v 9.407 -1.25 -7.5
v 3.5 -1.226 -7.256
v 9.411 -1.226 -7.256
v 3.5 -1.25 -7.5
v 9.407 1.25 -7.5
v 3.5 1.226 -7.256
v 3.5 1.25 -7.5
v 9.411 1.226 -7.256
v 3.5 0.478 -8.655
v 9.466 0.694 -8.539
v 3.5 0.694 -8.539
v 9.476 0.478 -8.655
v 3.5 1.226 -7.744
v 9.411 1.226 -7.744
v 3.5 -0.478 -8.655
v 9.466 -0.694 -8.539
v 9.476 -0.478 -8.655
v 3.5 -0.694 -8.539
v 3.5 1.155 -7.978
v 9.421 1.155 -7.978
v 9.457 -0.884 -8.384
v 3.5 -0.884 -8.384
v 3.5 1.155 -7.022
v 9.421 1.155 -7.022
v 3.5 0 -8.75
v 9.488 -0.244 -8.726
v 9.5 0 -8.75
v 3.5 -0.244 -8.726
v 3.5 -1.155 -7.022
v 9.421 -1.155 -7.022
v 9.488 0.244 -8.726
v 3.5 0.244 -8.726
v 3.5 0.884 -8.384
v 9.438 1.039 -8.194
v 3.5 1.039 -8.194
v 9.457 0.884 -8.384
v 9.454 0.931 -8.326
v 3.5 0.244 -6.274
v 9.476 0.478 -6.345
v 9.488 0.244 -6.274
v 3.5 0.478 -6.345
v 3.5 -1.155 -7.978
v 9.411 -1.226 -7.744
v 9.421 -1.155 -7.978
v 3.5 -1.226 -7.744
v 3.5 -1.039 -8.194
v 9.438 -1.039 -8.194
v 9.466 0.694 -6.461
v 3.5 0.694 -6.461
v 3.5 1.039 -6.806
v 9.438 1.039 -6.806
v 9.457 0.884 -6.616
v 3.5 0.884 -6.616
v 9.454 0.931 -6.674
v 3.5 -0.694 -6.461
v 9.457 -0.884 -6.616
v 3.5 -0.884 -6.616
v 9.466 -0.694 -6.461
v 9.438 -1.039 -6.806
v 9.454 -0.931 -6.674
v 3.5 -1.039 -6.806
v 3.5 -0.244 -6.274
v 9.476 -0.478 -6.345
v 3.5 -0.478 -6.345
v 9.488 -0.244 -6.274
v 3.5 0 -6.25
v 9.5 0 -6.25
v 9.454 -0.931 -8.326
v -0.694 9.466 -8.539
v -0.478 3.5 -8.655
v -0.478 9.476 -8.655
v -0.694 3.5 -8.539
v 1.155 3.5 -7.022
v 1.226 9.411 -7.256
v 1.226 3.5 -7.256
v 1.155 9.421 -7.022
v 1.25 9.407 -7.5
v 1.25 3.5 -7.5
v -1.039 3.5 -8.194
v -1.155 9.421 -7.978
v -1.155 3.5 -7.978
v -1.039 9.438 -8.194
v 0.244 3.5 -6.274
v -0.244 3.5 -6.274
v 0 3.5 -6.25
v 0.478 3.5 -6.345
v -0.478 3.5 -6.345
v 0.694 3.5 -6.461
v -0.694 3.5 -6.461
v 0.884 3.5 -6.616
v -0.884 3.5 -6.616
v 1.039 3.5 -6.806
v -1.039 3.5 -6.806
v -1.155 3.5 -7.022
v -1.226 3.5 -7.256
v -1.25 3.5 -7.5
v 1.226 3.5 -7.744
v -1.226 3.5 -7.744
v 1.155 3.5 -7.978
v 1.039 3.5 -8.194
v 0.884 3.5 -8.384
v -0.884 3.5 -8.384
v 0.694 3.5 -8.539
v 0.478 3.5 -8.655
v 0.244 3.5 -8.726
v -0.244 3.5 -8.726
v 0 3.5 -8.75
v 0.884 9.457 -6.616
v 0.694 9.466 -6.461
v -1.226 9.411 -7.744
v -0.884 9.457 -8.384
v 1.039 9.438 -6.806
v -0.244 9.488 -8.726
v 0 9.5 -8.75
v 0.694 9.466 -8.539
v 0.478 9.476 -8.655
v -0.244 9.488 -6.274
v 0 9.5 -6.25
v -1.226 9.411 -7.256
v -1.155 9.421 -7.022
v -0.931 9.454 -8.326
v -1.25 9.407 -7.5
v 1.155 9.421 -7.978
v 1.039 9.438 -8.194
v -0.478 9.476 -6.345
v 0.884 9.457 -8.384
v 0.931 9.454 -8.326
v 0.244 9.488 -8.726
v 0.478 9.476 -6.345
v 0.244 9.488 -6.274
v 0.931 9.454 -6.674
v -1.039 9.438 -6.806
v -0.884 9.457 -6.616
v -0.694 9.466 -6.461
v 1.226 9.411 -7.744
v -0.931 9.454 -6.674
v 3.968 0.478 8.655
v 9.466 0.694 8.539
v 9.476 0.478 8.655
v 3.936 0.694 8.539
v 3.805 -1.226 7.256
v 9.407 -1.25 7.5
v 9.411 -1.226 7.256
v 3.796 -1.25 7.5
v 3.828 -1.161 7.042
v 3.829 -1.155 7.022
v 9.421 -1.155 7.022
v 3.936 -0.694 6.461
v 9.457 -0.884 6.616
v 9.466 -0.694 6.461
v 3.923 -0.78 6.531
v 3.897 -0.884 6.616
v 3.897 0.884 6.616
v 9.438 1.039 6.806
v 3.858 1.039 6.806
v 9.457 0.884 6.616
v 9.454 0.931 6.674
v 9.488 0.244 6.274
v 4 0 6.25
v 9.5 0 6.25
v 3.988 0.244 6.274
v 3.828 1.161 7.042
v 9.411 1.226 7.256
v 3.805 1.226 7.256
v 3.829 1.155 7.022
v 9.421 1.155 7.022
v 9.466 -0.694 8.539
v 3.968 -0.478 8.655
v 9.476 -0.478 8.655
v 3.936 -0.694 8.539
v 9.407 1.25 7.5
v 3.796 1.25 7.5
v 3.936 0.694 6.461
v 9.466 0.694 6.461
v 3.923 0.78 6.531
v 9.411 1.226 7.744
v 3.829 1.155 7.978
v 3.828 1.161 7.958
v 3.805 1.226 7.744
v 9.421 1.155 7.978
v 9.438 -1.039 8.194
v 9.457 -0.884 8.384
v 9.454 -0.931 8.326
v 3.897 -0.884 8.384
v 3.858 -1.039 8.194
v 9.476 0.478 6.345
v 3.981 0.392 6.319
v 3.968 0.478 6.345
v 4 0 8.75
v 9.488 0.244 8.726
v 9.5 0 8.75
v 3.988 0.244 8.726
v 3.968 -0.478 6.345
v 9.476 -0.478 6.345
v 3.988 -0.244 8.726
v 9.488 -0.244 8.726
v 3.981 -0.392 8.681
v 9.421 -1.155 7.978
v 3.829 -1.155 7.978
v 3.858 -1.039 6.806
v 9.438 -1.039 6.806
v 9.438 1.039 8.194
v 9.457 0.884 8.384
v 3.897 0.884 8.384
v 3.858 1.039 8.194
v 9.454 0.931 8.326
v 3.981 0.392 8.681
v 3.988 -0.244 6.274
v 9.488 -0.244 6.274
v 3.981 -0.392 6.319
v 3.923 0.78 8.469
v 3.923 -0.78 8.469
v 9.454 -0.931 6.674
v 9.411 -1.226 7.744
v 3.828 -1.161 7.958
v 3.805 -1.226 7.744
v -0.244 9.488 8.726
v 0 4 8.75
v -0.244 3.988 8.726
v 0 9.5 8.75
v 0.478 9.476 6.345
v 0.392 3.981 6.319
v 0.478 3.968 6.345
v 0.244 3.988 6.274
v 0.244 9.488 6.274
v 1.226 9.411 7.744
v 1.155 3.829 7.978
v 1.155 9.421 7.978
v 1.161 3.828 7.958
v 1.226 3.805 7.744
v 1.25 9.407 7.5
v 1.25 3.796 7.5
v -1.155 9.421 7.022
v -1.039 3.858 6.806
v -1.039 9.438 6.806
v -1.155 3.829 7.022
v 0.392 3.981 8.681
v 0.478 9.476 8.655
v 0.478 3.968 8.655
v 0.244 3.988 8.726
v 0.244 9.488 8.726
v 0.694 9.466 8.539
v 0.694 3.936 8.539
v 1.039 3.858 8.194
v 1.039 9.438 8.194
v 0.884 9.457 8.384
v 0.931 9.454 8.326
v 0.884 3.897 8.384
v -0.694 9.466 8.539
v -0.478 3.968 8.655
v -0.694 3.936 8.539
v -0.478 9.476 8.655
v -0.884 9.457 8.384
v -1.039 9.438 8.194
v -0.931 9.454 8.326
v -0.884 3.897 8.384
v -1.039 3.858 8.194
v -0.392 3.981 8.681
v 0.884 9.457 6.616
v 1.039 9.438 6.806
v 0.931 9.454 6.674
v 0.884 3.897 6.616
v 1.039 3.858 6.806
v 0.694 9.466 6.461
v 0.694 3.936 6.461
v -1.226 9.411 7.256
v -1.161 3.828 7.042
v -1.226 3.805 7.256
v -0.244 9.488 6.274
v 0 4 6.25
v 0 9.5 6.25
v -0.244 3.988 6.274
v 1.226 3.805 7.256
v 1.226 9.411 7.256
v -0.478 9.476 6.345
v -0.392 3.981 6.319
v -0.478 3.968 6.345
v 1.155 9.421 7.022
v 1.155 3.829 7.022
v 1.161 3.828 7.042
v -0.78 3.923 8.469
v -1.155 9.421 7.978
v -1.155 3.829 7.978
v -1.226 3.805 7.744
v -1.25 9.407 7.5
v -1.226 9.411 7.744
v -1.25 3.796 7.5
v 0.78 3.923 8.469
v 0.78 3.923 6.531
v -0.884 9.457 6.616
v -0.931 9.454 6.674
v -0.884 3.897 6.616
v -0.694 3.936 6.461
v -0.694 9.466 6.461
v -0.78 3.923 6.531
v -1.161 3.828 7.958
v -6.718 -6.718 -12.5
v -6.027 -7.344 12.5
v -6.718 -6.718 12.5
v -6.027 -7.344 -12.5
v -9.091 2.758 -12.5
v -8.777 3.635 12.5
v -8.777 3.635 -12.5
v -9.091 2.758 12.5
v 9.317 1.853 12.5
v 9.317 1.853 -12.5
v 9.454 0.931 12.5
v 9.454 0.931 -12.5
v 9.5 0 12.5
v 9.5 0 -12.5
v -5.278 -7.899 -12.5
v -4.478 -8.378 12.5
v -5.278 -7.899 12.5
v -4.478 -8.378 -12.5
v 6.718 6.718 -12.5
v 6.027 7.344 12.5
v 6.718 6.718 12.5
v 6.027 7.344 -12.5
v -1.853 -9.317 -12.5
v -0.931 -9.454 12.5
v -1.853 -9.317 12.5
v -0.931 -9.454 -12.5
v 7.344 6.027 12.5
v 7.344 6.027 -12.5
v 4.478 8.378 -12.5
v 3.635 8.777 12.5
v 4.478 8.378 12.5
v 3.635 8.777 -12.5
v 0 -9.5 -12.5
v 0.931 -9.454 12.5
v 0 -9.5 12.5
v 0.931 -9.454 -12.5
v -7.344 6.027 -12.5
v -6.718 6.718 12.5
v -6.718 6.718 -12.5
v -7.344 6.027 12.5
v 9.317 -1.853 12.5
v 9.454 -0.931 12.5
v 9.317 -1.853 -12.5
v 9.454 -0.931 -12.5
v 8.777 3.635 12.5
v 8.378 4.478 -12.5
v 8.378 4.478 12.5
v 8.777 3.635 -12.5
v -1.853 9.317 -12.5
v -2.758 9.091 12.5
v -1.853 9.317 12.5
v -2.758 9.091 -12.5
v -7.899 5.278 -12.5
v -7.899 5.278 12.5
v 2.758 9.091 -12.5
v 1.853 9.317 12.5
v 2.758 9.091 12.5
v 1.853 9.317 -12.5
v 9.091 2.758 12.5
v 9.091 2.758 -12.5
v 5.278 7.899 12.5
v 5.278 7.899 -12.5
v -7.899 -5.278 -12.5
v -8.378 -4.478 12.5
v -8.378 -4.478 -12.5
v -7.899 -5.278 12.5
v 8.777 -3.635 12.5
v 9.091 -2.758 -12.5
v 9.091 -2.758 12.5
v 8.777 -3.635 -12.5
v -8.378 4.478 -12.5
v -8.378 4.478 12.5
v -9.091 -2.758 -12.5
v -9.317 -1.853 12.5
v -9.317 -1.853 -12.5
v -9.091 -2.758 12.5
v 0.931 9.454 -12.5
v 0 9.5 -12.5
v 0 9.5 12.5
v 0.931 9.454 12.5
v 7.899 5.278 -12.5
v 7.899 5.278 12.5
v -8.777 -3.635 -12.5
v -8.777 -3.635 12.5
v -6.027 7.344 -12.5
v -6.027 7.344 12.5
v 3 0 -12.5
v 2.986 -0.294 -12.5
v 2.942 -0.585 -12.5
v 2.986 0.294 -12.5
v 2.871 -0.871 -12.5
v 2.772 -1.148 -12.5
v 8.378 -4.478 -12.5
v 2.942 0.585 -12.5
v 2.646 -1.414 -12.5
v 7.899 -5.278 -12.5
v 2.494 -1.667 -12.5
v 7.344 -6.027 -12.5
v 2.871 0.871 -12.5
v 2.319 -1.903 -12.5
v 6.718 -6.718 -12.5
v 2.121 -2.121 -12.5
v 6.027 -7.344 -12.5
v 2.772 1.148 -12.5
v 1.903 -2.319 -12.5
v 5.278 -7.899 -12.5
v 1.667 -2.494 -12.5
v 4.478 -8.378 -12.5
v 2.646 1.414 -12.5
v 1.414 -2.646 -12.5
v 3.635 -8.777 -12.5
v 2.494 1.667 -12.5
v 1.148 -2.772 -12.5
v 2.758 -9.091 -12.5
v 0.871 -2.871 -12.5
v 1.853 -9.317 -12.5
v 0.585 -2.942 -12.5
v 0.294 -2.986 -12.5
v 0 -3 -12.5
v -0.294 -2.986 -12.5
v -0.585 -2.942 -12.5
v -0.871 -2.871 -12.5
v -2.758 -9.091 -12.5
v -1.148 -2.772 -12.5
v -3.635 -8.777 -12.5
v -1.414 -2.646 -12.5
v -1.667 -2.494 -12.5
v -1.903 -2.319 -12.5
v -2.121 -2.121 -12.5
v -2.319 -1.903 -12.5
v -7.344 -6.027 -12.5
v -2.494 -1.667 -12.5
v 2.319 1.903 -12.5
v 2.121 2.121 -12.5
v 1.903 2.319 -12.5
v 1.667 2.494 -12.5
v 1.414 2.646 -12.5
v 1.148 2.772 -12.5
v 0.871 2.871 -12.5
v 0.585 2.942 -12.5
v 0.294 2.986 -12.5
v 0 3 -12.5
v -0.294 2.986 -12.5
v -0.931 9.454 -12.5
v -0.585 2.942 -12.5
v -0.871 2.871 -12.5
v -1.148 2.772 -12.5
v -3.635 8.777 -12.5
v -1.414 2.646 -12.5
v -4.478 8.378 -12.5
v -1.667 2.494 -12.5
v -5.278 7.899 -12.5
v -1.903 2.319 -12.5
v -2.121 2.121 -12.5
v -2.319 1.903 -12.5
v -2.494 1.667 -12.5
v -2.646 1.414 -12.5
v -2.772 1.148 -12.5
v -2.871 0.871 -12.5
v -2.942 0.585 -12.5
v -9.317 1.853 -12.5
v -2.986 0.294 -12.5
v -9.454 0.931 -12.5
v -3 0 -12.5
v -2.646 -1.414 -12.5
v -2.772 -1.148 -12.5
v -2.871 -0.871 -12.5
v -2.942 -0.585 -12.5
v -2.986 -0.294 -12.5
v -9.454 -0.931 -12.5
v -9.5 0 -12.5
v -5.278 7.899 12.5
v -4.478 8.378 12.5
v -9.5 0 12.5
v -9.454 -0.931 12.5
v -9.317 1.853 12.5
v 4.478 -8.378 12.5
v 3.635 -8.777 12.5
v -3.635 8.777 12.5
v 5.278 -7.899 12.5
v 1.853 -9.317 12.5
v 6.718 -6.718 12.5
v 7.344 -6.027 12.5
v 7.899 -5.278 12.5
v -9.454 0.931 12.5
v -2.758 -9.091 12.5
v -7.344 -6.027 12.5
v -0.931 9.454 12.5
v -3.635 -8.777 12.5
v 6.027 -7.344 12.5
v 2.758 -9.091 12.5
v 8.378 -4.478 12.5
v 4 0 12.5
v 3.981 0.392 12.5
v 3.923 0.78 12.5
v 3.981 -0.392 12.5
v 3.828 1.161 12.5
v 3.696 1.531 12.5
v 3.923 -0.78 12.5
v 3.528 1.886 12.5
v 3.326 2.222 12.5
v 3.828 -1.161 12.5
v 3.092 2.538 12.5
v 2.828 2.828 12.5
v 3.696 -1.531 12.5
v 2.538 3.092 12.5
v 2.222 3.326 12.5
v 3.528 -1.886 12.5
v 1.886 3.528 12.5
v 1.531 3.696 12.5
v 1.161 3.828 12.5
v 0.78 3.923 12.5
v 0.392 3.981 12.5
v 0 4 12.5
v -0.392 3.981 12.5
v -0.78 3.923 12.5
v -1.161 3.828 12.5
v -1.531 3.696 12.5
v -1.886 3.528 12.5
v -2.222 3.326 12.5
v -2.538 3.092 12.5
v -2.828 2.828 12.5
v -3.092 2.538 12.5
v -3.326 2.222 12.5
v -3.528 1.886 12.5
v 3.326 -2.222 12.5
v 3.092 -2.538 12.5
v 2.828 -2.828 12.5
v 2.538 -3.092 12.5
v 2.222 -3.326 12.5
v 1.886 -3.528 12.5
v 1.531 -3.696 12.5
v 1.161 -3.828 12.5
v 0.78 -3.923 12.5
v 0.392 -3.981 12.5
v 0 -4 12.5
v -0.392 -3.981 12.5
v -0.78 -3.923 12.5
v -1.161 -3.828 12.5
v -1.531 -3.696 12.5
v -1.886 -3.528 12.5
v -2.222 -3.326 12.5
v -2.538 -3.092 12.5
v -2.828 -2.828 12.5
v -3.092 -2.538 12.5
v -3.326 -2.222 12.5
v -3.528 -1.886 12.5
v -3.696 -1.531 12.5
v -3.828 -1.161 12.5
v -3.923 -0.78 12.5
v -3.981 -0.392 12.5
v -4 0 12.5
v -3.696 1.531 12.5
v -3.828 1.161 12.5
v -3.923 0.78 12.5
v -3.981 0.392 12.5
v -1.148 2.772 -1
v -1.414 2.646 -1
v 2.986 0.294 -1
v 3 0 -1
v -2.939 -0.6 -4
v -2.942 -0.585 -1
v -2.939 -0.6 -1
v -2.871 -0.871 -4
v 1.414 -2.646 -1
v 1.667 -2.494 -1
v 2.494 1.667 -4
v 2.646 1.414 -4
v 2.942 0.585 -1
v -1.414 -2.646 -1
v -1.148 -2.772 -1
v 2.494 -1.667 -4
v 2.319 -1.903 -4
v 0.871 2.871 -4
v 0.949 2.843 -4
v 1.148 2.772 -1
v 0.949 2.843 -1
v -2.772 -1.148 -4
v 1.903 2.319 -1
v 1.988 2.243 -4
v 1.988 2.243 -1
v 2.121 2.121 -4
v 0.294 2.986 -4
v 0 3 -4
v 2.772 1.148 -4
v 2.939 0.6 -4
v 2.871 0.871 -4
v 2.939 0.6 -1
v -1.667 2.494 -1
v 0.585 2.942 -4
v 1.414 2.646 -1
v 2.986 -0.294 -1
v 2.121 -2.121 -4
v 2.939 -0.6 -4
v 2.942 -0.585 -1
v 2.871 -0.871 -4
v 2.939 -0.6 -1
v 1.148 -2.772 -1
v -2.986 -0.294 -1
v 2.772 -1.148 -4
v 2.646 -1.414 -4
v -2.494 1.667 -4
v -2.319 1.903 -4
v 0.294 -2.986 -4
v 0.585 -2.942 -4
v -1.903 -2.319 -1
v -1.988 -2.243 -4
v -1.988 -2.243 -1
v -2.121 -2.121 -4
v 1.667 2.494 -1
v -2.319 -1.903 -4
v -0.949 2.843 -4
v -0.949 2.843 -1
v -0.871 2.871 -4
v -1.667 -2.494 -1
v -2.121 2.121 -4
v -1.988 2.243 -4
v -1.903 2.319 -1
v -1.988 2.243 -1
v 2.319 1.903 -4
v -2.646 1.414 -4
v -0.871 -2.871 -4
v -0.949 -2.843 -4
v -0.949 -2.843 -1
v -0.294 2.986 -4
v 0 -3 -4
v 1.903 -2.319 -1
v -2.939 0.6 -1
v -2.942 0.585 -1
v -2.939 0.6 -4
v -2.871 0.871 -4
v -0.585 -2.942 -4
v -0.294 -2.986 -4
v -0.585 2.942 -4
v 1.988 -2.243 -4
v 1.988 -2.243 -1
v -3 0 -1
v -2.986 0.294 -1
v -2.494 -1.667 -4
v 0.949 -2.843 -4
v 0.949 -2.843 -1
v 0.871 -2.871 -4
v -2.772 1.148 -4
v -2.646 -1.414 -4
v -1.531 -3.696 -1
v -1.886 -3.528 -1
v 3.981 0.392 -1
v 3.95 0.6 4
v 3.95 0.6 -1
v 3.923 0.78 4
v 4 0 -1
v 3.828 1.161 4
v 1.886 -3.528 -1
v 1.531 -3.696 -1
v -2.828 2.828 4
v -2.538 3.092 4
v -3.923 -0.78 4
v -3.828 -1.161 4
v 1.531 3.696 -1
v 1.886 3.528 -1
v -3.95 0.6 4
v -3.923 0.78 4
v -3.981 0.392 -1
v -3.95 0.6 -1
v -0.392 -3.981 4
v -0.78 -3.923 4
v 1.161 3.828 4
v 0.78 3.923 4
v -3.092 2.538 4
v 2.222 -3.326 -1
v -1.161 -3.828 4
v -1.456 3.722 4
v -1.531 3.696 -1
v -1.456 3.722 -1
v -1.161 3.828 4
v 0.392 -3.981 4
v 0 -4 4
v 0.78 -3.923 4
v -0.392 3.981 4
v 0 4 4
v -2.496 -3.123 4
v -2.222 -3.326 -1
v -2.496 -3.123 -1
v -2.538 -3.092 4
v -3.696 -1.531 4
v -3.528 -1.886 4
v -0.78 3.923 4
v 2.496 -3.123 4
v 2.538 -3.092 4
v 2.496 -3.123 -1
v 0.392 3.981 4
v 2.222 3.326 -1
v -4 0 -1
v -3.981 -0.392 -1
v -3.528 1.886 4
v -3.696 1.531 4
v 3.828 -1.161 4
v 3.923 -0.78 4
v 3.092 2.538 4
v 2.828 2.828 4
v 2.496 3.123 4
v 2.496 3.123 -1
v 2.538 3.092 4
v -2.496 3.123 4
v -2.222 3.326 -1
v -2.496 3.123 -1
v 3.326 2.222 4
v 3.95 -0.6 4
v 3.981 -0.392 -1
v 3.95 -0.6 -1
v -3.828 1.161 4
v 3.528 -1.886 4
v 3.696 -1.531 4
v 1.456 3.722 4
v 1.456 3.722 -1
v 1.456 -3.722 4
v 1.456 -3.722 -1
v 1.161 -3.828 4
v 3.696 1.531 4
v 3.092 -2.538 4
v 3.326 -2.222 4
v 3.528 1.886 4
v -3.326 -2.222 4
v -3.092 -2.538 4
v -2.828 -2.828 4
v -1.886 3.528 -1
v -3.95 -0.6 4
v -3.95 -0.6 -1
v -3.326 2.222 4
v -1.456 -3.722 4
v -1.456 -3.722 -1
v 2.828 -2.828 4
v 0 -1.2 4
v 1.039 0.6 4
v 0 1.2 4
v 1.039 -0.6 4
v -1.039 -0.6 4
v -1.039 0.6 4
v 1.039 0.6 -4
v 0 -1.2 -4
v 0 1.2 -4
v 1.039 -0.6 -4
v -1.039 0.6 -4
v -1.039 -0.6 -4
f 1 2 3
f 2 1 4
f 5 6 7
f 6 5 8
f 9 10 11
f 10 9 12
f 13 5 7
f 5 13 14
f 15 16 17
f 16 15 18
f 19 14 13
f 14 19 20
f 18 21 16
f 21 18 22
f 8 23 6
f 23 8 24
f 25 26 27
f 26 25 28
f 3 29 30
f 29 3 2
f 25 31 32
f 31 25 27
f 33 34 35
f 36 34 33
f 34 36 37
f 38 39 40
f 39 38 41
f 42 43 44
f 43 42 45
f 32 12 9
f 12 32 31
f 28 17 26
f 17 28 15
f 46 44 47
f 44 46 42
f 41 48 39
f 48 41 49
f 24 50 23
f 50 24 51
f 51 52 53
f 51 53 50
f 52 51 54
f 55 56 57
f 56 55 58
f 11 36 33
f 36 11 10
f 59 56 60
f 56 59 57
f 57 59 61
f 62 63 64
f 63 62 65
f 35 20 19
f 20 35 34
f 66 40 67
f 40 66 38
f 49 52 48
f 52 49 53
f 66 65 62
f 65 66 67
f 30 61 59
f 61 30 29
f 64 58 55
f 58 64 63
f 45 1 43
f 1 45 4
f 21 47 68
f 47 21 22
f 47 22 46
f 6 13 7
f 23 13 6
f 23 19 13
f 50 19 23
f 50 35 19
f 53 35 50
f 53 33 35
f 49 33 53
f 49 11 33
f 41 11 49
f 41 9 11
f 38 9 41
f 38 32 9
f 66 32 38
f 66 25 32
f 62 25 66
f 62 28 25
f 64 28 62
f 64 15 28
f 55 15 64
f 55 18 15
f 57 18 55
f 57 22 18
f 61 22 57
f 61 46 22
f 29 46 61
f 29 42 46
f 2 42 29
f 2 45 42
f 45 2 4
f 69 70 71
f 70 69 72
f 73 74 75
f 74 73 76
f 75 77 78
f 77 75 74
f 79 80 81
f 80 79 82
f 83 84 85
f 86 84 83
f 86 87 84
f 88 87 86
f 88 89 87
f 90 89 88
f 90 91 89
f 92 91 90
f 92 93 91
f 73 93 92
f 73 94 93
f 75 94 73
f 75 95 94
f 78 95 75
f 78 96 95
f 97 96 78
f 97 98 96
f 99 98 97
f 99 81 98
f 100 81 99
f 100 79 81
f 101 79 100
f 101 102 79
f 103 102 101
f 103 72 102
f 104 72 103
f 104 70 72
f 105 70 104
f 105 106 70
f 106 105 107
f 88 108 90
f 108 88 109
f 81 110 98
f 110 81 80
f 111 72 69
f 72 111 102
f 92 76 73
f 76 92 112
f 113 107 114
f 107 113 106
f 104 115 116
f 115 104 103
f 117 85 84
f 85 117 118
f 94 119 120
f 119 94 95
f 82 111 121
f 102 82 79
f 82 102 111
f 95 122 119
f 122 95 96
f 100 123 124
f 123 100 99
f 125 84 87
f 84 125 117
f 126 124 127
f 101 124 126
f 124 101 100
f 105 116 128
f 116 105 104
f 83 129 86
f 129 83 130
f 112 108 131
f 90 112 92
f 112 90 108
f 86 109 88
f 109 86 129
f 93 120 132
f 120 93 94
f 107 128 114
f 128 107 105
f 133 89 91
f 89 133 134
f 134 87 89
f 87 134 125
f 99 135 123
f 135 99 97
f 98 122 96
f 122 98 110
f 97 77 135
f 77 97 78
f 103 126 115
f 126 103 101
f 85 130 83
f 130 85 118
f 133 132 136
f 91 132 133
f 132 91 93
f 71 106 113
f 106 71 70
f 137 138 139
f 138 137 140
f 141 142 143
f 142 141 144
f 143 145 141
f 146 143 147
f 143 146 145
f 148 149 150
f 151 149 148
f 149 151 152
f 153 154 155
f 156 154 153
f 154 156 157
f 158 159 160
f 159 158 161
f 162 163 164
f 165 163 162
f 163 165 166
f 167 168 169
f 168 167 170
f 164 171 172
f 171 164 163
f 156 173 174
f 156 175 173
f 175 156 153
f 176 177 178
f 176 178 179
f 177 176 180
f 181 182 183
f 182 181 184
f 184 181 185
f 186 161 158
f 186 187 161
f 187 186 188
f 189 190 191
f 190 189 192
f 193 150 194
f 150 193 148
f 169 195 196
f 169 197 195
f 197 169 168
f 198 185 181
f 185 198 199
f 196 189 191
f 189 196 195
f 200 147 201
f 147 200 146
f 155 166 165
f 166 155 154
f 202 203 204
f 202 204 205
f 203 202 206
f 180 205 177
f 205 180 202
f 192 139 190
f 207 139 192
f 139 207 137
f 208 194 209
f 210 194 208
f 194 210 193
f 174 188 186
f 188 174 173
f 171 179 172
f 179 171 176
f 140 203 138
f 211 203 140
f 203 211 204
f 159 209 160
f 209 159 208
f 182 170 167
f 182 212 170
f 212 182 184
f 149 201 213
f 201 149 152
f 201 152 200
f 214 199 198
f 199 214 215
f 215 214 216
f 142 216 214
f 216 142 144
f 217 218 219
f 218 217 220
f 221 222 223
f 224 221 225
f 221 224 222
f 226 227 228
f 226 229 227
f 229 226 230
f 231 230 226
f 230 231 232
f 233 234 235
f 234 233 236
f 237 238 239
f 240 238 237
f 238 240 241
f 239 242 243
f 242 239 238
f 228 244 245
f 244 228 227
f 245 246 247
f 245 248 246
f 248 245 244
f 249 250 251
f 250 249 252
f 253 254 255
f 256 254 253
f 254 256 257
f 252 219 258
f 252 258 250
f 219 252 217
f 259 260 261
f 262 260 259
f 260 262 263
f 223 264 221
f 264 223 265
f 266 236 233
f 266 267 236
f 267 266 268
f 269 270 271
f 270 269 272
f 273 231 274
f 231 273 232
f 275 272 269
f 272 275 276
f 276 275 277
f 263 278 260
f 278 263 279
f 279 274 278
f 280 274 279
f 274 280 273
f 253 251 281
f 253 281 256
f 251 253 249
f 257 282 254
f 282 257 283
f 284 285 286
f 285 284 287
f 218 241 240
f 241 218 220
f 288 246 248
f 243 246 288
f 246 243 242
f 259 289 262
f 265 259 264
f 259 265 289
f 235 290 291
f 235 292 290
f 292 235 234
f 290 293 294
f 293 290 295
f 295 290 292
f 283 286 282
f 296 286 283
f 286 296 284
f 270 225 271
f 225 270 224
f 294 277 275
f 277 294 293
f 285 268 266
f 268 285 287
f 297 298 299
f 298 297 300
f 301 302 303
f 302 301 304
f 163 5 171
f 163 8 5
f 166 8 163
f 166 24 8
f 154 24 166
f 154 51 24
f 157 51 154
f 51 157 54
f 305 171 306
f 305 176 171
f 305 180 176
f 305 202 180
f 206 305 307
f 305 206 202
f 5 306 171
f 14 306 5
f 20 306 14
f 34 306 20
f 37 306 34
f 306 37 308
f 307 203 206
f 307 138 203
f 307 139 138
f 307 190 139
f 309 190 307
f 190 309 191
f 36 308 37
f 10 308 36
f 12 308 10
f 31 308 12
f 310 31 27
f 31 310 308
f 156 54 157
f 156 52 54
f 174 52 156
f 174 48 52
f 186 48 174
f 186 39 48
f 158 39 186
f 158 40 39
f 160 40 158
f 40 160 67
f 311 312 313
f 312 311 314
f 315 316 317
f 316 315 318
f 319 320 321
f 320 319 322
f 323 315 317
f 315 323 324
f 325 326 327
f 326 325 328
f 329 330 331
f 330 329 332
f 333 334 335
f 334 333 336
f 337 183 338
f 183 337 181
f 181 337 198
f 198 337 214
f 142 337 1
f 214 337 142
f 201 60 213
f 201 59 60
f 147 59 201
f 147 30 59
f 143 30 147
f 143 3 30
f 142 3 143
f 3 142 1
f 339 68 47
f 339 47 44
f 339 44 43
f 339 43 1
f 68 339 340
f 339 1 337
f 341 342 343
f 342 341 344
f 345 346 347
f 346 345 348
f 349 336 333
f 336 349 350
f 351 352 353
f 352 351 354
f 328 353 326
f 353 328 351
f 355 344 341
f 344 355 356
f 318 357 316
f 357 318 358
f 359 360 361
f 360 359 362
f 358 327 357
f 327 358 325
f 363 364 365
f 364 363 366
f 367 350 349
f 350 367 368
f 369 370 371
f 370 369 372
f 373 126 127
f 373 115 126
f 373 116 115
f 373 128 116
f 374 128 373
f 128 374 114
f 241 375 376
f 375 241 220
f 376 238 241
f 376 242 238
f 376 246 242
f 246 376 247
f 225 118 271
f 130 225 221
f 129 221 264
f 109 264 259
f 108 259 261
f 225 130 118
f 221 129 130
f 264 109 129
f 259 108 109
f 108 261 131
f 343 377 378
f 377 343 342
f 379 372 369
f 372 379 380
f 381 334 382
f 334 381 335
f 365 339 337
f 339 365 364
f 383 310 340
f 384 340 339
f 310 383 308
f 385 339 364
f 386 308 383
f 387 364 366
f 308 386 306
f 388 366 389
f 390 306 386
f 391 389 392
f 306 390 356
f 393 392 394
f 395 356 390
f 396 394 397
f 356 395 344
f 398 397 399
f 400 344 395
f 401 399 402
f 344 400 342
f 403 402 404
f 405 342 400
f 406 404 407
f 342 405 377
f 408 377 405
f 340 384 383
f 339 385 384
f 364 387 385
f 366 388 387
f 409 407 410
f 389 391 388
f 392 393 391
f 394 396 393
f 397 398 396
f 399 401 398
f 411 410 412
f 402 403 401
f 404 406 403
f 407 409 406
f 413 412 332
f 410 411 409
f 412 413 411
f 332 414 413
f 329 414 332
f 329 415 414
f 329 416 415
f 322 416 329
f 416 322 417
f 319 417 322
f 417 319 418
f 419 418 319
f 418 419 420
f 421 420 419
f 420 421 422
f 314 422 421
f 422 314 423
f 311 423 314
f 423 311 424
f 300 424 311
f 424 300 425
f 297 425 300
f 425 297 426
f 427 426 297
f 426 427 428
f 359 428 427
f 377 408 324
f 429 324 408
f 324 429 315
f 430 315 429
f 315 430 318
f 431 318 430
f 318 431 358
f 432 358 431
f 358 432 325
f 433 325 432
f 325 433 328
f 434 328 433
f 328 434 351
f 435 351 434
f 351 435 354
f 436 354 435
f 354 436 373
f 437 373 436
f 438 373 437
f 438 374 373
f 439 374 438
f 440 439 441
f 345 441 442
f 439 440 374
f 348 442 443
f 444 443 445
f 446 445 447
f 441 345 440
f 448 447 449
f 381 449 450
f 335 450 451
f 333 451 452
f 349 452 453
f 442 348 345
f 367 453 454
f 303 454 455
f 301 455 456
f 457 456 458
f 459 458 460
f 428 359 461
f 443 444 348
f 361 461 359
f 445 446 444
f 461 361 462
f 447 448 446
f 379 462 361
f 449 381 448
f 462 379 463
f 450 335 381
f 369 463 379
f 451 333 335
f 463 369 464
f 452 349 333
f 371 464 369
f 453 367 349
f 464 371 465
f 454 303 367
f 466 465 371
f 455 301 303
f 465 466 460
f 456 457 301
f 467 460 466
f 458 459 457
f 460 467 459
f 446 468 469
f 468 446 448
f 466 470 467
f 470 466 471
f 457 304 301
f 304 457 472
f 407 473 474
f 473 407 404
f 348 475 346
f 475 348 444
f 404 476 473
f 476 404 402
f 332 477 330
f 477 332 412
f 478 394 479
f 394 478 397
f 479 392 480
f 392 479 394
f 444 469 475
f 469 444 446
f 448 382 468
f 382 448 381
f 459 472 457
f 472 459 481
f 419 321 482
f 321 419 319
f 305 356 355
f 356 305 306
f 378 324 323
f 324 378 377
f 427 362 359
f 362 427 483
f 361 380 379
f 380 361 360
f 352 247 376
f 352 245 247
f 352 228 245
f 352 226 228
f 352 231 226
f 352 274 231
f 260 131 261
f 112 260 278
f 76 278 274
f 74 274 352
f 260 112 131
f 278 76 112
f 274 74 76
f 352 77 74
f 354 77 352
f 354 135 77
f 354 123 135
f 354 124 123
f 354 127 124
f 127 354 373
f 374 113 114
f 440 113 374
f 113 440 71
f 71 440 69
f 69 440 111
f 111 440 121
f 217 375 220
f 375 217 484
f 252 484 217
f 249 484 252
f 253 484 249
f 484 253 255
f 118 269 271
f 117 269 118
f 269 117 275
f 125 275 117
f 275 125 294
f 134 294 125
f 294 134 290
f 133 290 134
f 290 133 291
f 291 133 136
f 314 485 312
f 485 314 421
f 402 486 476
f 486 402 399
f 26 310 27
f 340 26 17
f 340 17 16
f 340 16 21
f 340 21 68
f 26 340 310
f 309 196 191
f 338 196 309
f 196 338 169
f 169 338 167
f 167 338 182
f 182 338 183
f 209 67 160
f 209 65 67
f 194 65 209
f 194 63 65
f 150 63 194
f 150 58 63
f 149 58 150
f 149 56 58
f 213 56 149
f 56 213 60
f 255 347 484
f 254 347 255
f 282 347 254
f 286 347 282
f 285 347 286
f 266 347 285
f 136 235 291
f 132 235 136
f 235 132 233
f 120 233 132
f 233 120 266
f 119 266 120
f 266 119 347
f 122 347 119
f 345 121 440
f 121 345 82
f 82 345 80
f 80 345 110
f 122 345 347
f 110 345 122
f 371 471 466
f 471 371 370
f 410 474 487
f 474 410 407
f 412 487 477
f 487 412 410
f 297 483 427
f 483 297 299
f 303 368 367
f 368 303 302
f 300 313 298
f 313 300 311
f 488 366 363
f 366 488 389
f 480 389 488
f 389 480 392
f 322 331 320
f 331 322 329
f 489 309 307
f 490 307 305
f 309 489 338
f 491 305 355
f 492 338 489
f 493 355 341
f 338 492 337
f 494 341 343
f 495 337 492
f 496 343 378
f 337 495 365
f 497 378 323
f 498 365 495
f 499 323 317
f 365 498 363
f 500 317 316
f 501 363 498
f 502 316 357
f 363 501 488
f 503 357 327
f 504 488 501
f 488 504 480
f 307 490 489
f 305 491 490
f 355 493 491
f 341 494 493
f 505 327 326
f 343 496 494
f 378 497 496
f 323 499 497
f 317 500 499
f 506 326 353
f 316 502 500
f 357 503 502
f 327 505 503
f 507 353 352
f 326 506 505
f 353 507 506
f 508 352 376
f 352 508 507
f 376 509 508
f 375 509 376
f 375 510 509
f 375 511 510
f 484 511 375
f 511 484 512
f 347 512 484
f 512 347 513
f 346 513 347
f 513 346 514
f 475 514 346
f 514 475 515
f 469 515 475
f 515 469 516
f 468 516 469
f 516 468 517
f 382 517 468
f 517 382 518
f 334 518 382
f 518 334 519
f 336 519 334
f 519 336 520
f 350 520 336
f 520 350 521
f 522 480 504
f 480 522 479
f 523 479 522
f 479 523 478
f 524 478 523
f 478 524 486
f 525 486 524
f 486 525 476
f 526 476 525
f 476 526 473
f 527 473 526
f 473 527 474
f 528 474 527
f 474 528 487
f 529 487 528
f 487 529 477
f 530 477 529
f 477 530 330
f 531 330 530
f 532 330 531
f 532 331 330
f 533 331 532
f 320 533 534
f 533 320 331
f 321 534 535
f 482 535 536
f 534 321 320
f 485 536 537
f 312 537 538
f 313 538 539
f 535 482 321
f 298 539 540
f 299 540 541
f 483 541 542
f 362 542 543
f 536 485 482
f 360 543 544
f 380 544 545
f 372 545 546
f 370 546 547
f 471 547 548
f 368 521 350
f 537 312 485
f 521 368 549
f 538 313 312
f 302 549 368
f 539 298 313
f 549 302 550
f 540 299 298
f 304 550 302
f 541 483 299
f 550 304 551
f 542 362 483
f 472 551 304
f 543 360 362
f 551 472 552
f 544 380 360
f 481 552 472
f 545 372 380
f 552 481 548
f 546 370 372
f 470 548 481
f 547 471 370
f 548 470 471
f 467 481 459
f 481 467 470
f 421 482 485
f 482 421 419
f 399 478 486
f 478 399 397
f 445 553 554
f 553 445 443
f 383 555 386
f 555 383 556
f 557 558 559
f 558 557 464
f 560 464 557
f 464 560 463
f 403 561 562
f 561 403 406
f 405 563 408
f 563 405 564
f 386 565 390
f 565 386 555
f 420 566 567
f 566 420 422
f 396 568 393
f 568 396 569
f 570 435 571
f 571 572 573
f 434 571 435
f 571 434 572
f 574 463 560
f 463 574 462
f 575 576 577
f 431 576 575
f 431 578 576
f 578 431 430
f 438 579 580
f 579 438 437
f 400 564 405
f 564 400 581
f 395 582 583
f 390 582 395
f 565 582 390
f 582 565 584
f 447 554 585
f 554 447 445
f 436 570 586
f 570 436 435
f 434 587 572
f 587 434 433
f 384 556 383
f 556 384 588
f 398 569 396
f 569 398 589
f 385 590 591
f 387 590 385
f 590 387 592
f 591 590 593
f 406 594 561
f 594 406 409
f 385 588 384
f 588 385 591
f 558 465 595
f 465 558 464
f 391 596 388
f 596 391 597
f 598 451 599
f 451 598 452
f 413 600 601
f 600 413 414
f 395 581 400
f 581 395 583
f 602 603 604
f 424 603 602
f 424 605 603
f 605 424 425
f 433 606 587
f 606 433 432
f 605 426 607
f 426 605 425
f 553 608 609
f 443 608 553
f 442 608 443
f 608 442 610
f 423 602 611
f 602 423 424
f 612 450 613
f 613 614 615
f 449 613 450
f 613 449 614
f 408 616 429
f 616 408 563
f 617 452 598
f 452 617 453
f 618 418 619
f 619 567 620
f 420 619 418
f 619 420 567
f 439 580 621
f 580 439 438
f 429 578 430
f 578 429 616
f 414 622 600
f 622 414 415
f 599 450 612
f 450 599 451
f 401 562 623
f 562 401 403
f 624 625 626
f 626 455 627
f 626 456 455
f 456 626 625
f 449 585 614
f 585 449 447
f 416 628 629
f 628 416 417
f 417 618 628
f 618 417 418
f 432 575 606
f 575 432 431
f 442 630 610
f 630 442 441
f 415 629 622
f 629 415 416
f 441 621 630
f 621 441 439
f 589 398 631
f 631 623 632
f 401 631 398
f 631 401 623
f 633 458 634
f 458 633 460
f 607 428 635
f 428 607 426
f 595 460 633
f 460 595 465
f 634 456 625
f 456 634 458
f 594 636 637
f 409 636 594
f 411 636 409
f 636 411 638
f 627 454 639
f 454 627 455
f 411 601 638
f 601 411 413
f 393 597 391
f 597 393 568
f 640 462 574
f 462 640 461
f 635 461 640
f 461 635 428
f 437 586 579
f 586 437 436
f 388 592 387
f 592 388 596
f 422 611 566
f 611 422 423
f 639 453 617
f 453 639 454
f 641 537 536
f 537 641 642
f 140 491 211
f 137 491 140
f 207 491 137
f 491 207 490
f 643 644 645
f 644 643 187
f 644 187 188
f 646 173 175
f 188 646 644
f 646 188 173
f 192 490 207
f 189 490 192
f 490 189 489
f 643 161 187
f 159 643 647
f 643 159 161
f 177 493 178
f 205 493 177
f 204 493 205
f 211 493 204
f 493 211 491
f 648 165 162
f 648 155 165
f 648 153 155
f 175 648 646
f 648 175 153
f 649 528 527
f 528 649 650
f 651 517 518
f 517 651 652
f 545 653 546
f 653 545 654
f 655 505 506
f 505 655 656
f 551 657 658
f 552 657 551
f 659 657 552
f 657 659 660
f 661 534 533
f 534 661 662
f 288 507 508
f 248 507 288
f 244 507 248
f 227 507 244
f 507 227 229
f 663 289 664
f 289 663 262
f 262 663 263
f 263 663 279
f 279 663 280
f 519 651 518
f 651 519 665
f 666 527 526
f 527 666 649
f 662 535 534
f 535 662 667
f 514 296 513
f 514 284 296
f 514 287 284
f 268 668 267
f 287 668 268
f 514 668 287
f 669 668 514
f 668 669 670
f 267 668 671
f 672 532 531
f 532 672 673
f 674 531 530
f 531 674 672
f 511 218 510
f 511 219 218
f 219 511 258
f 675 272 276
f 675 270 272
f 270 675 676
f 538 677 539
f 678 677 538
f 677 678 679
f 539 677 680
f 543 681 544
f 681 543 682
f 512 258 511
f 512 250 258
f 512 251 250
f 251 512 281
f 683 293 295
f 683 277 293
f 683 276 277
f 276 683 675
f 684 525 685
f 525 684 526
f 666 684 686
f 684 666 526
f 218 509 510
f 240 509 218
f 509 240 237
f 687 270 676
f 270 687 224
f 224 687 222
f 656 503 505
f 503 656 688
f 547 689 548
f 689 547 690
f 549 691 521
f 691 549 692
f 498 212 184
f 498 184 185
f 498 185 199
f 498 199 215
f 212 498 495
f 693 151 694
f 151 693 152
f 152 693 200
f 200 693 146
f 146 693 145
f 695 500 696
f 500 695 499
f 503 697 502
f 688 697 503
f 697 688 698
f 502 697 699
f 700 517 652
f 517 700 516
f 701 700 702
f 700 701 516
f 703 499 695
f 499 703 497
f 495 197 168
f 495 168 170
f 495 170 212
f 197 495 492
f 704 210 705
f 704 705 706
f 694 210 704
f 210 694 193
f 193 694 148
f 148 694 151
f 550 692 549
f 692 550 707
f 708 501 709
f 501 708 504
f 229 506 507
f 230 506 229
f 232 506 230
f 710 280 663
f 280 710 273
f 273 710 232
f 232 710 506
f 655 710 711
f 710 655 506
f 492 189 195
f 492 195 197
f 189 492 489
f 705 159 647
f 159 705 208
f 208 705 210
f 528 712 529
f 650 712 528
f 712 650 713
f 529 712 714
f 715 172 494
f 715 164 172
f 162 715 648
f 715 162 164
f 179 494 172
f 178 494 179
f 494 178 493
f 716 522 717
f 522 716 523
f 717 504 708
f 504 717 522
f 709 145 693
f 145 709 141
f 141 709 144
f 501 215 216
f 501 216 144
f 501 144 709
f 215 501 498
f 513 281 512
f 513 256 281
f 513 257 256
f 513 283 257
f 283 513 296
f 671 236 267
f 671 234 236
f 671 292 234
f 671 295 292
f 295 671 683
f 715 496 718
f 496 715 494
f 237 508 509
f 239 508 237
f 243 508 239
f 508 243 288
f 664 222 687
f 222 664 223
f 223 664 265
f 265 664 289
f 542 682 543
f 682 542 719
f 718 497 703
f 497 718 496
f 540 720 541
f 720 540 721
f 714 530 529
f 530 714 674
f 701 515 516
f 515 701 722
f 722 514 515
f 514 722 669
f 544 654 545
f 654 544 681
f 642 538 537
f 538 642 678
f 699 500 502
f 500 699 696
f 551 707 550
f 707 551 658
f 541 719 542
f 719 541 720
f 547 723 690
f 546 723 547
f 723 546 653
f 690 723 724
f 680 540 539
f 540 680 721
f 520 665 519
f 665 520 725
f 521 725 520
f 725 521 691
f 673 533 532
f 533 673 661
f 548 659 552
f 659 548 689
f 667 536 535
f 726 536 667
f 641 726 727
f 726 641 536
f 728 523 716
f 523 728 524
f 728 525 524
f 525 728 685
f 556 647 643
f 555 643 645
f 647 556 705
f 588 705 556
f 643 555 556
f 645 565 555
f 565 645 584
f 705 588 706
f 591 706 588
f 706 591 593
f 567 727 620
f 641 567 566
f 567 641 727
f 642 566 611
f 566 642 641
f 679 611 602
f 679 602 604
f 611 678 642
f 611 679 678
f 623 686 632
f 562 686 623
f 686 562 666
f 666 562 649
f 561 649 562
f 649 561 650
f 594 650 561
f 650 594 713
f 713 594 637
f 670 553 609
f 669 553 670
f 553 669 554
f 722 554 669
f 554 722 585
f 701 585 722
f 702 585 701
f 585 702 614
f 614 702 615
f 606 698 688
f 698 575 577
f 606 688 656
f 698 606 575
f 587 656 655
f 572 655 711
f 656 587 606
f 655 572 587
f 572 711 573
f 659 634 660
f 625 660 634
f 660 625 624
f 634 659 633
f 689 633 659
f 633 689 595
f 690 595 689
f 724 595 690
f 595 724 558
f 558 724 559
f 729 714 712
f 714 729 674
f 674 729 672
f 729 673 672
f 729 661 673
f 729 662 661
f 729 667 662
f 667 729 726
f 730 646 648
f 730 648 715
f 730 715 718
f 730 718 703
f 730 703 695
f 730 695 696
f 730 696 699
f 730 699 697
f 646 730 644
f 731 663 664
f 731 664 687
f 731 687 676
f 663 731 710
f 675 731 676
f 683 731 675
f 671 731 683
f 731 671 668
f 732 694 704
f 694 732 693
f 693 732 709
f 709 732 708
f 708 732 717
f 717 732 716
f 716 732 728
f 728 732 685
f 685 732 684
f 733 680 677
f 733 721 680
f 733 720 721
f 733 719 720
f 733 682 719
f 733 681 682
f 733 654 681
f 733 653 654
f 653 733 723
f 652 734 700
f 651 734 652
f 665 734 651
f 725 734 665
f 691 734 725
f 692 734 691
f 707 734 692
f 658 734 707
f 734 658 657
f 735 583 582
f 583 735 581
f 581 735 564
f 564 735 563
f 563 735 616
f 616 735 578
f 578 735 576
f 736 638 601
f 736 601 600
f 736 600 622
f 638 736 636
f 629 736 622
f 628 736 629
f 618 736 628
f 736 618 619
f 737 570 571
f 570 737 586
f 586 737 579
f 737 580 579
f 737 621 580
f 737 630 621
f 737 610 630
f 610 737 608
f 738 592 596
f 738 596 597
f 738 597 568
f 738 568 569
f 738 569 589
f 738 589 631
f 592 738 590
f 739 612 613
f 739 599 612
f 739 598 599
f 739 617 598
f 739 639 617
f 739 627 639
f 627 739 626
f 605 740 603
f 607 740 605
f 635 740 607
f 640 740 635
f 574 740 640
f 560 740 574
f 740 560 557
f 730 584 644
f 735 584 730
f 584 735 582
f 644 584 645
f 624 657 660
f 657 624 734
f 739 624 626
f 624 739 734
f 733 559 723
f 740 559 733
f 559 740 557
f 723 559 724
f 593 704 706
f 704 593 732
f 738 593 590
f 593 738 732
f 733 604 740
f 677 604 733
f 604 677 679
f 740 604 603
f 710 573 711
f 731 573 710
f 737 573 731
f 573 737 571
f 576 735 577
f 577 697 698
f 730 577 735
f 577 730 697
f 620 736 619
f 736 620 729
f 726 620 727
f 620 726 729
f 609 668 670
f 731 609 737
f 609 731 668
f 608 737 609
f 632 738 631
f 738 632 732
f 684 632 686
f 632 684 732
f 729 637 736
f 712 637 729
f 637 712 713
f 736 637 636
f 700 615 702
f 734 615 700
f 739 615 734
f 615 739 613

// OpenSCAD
// Parameters
outer_diameter_mm = 19; //[10:38:0.1]
length_mm = 25; //[12.5:50:0.1]
bore1_diameter_mm = 6; //[3:12:0.1]
bore2_diameter_mm = 8; //[4:16:0.1]
bore1_depth_mm = 12.5; //[6:25:0.1]
bore2_depth_mm = 12.5; //[6:25:0.1]
flexible = 1; //[0:1:1]
flex_section_length_mm = 8; //[4:16:0.1]
flex_slot_width_mm = 1.2; //[0.6:2.4:0.1]
flex_slot_radial_depth_mm = 5.5; //[3:8:0.1]
grub_screw_hole_diameter_mm = 2.5; //[1.5:3.5:0.1]
grub_screw_hole_depth_mm = 5; //[3:10:0.1]
grub_screw_axial_offset_mm = 5; //[2:10:0.1]
grub_screw_overlap_mm = 1; //[0.5:2:0.1]
connection_overlap_mm = 1; //[0.5:2:0.1]

// Flex - Detailed geometry
module flex() {
  if (flexible == 1) {
    color("Silver") {
      difference() {
        // Main body
        cylinder(r=outer_diameter_mm/2, h=flex_section_length_mm, center=true, $fn=64);
        // Flexible slots
        for (i = [0:5]) {
          rotate([0, 0, i*60])
          translate([0, 0, 0])
          cube([outer_diameter_mm + connection_overlap_mm*2, flex_slot_width_mm, flex_section_length_mm], center=true);
        }
      }
    }
  }
}

// Shaft Coupling - Detailed geometry
module shaft_coupling() {
  color("Silver") {
    difference() {
      // Main body
      cylinder(r=outer_diameter_mm/2, h=length_mm, center=true, $fn=64);
      // Bore 1
      translate([0, 0, -length_mm/2 + bore1_depth_mm/2])
        cylinder(r=bore1_diameter_mm/2, h=bore1_depth_mm + connection_overlap_mm, center=true, $fn=64);
      // Bore 2
      translate([0, 0, length_mm/2 - bore2_depth_mm/2])
        cylinder(r=bore2_diameter_mm/2, h=bore2_depth_mm + connection_overlap_mm, center=true, $fn=64);
      // Bore transition step
      cylinder(r=max(bore1_diameter_mm, bore2_diameter_mm)/2, h=connection_overlap_mm*2, center=true, $fn=64);
      // Grub screw holes
      for (i = [-1, 1]) {
        translate([outer_diameter_mm/2 - (grub_screw_hole_depth_mm + grub_screw_overlap_mm)/2, 0, i * (length_mm/2 - grub_screw_axial_offset_mm)])
          rotate([0, 90, 0])
          cylinder(r=grub_screw_hole_diameter_mm/2, h=grub_screw_hole_depth_mm + grub_screw_overlap_mm, center=true, $fn=32);
        translate([0, outer_diameter_mm/2 - (grub_screw_hole_depth_mm + grub_screw_overlap_mm)/2, i * (length_mm/2 - grub_screw_axial_offset_mm)])
          rotate([90, 0, 0])
          cylinder(r=grub_screw_hole_diameter_mm/2, h=grub_screw_hole_depth_mm + grub_screw_overlap_mm, center=true, $fn=32);
      }
    }
  }
}

// Assembly
module assembly() {
  shaft_coupling();
  if (flexible == 1) {
    translate([0, 0, 0]) flex();
  }
}

assembly();
